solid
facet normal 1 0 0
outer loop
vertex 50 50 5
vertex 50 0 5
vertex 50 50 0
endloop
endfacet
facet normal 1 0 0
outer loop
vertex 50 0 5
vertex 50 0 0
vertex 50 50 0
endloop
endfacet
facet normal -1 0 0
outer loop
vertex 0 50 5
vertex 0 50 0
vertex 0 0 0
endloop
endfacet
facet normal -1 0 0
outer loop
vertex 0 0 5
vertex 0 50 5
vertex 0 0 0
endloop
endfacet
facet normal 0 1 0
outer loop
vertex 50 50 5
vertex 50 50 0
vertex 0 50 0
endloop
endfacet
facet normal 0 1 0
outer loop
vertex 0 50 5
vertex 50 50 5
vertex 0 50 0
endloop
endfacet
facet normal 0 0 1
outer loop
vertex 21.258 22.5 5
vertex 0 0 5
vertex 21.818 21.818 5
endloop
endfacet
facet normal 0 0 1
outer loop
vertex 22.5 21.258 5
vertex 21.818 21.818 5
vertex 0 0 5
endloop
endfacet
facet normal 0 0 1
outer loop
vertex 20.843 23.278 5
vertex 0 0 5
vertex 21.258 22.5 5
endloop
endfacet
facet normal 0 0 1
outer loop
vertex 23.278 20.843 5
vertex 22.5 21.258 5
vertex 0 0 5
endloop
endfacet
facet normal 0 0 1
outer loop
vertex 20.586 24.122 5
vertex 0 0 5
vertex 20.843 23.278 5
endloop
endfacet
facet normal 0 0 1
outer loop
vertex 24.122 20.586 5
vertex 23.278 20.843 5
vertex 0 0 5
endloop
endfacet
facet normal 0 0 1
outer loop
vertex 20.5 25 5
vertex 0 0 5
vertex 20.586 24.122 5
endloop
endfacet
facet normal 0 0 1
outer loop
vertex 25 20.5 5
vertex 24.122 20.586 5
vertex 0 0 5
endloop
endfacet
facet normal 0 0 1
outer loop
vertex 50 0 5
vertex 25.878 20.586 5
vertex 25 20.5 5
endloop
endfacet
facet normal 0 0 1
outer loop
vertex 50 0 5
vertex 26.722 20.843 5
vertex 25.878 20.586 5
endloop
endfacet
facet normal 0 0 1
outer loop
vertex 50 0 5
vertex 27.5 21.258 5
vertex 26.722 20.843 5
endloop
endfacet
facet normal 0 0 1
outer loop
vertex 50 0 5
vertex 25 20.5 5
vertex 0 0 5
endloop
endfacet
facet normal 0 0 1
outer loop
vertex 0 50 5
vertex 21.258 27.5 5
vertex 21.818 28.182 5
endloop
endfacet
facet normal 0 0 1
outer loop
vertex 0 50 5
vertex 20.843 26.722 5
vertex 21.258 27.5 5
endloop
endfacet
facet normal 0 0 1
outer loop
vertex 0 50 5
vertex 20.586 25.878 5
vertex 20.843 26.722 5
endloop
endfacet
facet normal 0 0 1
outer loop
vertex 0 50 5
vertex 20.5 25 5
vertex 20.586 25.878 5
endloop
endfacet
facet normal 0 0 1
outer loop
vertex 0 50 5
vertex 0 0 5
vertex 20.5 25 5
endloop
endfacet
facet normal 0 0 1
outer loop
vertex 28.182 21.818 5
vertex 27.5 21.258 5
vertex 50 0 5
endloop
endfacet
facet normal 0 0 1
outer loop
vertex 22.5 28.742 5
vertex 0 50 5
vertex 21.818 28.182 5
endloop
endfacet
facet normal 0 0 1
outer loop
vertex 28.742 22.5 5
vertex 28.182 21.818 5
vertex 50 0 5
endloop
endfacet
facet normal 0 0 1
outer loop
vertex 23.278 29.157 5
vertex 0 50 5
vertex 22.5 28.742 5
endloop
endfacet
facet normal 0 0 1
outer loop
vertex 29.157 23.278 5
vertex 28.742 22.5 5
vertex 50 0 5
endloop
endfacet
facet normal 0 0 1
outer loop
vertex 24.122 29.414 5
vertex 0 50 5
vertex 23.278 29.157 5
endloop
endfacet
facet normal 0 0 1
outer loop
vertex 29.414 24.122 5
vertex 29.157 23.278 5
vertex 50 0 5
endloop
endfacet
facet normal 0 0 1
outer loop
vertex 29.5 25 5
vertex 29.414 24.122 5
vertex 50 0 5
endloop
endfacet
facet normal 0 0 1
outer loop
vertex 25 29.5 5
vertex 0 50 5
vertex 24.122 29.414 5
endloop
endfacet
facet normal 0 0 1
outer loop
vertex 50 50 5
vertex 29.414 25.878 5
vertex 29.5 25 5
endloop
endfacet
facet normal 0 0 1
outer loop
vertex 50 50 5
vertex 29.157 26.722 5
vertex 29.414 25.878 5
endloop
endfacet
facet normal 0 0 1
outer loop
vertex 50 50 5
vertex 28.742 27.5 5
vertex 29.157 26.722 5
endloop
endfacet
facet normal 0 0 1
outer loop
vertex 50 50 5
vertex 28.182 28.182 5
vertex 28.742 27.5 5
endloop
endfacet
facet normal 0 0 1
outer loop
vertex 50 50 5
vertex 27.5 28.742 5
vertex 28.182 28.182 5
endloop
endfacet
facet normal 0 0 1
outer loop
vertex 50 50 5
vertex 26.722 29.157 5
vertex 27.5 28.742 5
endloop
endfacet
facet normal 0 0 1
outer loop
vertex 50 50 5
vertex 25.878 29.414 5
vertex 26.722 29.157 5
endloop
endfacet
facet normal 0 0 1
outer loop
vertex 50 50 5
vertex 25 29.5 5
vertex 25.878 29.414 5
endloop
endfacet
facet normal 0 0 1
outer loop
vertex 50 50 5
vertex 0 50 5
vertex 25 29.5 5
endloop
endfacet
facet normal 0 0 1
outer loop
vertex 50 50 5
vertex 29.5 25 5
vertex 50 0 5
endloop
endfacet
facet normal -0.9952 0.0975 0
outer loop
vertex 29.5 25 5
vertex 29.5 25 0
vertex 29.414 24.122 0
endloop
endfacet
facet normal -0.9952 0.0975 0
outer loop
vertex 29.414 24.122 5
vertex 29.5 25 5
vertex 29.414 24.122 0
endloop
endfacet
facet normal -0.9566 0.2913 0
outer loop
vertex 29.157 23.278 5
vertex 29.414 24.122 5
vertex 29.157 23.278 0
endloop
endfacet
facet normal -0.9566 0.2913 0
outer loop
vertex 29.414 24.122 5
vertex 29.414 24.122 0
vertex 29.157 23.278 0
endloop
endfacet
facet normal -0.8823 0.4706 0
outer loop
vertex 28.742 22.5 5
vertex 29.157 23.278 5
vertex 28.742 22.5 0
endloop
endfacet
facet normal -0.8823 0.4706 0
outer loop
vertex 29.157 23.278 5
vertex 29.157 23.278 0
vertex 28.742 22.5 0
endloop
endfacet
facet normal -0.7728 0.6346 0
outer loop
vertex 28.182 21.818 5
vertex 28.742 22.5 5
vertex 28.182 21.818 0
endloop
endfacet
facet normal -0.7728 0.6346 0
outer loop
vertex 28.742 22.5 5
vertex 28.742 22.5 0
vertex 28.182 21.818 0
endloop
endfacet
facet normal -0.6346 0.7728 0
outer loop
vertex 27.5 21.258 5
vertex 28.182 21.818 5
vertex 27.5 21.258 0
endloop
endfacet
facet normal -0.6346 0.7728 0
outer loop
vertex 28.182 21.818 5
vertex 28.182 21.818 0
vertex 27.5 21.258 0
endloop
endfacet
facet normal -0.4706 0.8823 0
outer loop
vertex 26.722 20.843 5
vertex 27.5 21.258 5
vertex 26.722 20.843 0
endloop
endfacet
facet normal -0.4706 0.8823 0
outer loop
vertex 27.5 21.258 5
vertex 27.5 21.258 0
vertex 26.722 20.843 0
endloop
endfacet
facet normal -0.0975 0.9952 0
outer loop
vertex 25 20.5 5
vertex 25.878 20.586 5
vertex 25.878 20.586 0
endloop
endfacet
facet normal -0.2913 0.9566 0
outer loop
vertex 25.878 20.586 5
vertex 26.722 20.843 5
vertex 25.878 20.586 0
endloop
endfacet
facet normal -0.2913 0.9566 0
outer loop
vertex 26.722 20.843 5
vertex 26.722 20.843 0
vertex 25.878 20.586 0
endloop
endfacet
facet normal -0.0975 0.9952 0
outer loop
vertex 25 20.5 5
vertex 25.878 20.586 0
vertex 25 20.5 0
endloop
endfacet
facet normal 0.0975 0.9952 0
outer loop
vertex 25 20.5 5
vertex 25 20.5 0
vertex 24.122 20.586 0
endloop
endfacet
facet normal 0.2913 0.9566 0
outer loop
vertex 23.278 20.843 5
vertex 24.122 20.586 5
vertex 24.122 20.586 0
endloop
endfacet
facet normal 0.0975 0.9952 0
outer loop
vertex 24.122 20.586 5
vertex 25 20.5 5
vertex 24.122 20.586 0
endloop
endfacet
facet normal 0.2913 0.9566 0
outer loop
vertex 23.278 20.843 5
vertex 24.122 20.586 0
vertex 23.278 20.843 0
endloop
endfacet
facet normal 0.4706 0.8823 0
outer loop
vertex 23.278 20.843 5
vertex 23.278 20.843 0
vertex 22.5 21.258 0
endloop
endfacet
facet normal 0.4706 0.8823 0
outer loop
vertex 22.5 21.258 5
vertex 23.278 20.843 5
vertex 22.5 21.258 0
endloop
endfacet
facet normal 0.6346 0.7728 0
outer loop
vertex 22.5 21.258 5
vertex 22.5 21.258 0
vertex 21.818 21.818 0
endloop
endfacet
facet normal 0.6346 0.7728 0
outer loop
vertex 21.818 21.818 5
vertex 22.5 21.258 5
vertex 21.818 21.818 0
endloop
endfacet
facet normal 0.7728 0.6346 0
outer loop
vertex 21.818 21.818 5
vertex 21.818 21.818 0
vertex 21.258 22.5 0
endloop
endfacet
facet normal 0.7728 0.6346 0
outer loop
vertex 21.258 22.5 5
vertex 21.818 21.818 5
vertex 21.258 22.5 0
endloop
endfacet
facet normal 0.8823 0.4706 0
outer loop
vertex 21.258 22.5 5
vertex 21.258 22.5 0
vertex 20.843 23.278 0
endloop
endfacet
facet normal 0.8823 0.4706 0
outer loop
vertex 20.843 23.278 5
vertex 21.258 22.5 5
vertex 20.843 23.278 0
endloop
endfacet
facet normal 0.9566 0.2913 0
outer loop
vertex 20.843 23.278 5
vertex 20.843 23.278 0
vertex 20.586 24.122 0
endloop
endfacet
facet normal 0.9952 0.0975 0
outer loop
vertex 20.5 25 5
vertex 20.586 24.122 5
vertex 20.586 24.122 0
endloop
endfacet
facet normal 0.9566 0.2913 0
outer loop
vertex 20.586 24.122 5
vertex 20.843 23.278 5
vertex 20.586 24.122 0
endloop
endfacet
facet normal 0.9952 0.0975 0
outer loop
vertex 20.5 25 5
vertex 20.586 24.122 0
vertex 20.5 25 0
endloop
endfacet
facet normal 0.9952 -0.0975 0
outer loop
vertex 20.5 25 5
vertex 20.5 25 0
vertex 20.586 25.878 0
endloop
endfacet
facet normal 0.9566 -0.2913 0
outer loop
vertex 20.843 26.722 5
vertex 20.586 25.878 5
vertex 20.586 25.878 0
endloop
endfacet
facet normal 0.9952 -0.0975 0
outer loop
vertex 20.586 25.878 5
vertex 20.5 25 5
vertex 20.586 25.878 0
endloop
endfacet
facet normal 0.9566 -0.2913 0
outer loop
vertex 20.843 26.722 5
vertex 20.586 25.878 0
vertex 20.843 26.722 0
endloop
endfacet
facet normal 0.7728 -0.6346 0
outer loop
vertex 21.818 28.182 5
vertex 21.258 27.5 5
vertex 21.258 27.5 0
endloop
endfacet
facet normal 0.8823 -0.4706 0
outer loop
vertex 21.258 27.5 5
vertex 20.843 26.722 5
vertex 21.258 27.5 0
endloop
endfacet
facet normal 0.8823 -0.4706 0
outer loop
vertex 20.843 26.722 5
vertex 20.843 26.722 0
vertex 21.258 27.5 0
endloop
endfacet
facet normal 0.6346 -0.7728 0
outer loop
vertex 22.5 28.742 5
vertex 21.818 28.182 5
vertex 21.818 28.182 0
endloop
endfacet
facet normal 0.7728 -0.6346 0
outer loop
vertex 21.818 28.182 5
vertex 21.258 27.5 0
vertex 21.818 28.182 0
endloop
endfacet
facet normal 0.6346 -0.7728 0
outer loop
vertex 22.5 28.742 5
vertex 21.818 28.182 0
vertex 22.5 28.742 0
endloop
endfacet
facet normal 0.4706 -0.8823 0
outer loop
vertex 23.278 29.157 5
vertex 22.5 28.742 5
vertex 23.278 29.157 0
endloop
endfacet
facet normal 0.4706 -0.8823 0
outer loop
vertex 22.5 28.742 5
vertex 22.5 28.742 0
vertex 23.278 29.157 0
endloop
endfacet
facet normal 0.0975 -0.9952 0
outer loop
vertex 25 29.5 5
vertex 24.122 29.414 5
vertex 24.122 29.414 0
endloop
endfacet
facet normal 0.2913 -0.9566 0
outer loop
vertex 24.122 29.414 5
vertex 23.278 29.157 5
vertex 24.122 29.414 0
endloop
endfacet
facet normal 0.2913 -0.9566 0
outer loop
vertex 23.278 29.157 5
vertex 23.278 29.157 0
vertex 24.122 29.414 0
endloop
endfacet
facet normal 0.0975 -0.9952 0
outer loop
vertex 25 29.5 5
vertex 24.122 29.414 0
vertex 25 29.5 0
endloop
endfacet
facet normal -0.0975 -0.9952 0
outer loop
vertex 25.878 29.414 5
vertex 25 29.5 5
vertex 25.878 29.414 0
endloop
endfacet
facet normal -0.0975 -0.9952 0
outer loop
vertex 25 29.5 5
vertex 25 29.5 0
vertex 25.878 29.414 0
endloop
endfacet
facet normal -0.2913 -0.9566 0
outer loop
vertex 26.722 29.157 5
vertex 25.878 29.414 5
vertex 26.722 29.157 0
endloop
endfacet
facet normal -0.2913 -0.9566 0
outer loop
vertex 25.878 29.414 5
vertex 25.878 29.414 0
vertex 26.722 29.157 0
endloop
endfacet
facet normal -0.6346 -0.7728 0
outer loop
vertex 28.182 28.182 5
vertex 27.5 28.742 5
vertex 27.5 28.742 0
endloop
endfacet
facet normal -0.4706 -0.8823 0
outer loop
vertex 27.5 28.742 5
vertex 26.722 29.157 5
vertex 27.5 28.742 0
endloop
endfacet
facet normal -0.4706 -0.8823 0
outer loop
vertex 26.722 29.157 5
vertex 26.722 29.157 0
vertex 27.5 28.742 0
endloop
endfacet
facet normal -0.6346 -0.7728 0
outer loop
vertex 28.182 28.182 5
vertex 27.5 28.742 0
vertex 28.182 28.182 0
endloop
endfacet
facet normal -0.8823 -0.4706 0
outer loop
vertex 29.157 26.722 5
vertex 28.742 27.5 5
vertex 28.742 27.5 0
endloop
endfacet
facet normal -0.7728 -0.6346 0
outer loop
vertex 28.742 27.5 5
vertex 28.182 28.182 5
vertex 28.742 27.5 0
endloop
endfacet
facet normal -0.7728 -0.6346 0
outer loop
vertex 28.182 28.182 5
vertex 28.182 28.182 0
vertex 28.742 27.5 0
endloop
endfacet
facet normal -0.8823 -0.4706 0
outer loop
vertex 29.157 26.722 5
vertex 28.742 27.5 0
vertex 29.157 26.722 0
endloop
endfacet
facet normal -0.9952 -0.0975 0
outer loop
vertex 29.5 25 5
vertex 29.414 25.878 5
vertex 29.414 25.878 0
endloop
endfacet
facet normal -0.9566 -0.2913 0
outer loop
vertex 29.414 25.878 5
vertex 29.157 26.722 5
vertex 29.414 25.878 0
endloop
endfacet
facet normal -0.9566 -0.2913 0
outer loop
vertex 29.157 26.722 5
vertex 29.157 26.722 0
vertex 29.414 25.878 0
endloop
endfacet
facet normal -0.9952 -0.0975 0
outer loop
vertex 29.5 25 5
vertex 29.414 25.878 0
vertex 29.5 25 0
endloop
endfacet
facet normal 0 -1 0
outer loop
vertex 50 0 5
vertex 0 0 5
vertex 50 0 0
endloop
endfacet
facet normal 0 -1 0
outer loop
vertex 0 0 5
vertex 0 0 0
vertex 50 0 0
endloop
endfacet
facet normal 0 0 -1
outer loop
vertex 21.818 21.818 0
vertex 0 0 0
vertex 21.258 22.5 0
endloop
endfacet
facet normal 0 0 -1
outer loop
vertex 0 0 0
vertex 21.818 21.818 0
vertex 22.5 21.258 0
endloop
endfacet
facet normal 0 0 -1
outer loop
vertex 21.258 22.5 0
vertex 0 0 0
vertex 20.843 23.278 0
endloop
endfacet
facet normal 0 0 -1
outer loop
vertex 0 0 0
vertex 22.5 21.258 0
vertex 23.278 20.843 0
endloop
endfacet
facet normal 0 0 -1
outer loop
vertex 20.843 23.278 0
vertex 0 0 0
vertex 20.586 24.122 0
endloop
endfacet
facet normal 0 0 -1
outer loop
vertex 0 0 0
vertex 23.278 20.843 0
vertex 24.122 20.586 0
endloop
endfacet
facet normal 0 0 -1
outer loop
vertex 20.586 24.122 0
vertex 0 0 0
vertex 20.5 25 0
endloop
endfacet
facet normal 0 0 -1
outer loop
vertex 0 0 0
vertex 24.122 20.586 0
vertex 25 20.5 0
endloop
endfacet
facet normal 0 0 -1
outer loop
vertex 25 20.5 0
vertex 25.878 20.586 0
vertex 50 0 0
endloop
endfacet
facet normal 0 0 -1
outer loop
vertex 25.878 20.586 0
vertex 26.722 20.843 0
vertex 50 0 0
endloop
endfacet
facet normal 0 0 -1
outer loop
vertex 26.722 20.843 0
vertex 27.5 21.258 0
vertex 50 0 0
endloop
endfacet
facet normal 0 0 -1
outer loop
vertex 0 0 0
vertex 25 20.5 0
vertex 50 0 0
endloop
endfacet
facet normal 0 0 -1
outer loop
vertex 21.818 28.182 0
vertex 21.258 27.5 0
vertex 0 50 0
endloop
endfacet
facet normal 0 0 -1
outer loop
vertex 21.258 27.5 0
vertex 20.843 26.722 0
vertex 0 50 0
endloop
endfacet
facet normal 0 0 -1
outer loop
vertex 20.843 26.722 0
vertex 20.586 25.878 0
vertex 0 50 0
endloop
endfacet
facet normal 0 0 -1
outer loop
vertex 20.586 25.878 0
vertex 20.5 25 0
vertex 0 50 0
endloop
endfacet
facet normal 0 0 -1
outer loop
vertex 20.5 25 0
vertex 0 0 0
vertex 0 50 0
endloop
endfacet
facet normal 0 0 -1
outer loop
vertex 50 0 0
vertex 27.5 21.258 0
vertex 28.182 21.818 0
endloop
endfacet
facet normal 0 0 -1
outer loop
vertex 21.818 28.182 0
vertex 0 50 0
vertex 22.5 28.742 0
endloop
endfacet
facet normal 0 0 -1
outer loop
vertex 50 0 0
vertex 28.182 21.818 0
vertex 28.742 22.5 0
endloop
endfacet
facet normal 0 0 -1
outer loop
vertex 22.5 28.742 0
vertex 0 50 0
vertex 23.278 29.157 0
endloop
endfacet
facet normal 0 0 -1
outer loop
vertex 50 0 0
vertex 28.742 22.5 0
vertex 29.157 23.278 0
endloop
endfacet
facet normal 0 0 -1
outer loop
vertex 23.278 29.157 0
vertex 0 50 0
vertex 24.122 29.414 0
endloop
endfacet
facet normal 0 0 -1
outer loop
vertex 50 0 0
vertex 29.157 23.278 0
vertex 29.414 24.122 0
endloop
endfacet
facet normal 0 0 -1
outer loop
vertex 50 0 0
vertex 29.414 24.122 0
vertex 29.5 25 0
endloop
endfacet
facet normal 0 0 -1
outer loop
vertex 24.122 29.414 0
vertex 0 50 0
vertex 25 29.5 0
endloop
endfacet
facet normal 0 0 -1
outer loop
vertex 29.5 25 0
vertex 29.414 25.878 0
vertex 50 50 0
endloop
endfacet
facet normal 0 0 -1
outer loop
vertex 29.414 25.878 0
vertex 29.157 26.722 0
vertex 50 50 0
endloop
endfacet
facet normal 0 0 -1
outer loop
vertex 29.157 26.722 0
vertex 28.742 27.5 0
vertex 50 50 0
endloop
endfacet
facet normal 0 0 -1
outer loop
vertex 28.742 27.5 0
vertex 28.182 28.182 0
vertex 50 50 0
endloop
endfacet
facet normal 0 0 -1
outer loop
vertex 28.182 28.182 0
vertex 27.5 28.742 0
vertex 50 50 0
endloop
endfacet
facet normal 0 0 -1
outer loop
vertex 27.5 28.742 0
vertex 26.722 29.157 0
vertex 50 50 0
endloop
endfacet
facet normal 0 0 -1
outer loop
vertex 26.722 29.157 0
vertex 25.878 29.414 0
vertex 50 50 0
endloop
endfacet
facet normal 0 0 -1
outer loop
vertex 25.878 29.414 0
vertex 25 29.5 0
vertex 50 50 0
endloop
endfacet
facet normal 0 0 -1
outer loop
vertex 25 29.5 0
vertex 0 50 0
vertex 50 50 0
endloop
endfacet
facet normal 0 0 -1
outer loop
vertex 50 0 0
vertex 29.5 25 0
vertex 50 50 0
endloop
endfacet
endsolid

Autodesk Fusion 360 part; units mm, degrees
sketch "Sketch1" plane through (0, 0, 0) normal (0, 0, 1) x (1, 0, 0)
  line L0 (0, 0) -> (50, 0)
  line L1 (50, 0) -> (50, 50)
  line L2 (50, 50) -> (0, 50)
  line L3 (0, 50) -> (0, 0)
  circle A0 centre (25, 25) radius 4.5
  dimension "d1" = 50
  dimension "d2" = 50
  dimension "d3" = 9
  dimension "d4" = 25
  dimension "d5" = 25
extrude "Extrude1" add sketch "Sketch1" along normal blind 5
